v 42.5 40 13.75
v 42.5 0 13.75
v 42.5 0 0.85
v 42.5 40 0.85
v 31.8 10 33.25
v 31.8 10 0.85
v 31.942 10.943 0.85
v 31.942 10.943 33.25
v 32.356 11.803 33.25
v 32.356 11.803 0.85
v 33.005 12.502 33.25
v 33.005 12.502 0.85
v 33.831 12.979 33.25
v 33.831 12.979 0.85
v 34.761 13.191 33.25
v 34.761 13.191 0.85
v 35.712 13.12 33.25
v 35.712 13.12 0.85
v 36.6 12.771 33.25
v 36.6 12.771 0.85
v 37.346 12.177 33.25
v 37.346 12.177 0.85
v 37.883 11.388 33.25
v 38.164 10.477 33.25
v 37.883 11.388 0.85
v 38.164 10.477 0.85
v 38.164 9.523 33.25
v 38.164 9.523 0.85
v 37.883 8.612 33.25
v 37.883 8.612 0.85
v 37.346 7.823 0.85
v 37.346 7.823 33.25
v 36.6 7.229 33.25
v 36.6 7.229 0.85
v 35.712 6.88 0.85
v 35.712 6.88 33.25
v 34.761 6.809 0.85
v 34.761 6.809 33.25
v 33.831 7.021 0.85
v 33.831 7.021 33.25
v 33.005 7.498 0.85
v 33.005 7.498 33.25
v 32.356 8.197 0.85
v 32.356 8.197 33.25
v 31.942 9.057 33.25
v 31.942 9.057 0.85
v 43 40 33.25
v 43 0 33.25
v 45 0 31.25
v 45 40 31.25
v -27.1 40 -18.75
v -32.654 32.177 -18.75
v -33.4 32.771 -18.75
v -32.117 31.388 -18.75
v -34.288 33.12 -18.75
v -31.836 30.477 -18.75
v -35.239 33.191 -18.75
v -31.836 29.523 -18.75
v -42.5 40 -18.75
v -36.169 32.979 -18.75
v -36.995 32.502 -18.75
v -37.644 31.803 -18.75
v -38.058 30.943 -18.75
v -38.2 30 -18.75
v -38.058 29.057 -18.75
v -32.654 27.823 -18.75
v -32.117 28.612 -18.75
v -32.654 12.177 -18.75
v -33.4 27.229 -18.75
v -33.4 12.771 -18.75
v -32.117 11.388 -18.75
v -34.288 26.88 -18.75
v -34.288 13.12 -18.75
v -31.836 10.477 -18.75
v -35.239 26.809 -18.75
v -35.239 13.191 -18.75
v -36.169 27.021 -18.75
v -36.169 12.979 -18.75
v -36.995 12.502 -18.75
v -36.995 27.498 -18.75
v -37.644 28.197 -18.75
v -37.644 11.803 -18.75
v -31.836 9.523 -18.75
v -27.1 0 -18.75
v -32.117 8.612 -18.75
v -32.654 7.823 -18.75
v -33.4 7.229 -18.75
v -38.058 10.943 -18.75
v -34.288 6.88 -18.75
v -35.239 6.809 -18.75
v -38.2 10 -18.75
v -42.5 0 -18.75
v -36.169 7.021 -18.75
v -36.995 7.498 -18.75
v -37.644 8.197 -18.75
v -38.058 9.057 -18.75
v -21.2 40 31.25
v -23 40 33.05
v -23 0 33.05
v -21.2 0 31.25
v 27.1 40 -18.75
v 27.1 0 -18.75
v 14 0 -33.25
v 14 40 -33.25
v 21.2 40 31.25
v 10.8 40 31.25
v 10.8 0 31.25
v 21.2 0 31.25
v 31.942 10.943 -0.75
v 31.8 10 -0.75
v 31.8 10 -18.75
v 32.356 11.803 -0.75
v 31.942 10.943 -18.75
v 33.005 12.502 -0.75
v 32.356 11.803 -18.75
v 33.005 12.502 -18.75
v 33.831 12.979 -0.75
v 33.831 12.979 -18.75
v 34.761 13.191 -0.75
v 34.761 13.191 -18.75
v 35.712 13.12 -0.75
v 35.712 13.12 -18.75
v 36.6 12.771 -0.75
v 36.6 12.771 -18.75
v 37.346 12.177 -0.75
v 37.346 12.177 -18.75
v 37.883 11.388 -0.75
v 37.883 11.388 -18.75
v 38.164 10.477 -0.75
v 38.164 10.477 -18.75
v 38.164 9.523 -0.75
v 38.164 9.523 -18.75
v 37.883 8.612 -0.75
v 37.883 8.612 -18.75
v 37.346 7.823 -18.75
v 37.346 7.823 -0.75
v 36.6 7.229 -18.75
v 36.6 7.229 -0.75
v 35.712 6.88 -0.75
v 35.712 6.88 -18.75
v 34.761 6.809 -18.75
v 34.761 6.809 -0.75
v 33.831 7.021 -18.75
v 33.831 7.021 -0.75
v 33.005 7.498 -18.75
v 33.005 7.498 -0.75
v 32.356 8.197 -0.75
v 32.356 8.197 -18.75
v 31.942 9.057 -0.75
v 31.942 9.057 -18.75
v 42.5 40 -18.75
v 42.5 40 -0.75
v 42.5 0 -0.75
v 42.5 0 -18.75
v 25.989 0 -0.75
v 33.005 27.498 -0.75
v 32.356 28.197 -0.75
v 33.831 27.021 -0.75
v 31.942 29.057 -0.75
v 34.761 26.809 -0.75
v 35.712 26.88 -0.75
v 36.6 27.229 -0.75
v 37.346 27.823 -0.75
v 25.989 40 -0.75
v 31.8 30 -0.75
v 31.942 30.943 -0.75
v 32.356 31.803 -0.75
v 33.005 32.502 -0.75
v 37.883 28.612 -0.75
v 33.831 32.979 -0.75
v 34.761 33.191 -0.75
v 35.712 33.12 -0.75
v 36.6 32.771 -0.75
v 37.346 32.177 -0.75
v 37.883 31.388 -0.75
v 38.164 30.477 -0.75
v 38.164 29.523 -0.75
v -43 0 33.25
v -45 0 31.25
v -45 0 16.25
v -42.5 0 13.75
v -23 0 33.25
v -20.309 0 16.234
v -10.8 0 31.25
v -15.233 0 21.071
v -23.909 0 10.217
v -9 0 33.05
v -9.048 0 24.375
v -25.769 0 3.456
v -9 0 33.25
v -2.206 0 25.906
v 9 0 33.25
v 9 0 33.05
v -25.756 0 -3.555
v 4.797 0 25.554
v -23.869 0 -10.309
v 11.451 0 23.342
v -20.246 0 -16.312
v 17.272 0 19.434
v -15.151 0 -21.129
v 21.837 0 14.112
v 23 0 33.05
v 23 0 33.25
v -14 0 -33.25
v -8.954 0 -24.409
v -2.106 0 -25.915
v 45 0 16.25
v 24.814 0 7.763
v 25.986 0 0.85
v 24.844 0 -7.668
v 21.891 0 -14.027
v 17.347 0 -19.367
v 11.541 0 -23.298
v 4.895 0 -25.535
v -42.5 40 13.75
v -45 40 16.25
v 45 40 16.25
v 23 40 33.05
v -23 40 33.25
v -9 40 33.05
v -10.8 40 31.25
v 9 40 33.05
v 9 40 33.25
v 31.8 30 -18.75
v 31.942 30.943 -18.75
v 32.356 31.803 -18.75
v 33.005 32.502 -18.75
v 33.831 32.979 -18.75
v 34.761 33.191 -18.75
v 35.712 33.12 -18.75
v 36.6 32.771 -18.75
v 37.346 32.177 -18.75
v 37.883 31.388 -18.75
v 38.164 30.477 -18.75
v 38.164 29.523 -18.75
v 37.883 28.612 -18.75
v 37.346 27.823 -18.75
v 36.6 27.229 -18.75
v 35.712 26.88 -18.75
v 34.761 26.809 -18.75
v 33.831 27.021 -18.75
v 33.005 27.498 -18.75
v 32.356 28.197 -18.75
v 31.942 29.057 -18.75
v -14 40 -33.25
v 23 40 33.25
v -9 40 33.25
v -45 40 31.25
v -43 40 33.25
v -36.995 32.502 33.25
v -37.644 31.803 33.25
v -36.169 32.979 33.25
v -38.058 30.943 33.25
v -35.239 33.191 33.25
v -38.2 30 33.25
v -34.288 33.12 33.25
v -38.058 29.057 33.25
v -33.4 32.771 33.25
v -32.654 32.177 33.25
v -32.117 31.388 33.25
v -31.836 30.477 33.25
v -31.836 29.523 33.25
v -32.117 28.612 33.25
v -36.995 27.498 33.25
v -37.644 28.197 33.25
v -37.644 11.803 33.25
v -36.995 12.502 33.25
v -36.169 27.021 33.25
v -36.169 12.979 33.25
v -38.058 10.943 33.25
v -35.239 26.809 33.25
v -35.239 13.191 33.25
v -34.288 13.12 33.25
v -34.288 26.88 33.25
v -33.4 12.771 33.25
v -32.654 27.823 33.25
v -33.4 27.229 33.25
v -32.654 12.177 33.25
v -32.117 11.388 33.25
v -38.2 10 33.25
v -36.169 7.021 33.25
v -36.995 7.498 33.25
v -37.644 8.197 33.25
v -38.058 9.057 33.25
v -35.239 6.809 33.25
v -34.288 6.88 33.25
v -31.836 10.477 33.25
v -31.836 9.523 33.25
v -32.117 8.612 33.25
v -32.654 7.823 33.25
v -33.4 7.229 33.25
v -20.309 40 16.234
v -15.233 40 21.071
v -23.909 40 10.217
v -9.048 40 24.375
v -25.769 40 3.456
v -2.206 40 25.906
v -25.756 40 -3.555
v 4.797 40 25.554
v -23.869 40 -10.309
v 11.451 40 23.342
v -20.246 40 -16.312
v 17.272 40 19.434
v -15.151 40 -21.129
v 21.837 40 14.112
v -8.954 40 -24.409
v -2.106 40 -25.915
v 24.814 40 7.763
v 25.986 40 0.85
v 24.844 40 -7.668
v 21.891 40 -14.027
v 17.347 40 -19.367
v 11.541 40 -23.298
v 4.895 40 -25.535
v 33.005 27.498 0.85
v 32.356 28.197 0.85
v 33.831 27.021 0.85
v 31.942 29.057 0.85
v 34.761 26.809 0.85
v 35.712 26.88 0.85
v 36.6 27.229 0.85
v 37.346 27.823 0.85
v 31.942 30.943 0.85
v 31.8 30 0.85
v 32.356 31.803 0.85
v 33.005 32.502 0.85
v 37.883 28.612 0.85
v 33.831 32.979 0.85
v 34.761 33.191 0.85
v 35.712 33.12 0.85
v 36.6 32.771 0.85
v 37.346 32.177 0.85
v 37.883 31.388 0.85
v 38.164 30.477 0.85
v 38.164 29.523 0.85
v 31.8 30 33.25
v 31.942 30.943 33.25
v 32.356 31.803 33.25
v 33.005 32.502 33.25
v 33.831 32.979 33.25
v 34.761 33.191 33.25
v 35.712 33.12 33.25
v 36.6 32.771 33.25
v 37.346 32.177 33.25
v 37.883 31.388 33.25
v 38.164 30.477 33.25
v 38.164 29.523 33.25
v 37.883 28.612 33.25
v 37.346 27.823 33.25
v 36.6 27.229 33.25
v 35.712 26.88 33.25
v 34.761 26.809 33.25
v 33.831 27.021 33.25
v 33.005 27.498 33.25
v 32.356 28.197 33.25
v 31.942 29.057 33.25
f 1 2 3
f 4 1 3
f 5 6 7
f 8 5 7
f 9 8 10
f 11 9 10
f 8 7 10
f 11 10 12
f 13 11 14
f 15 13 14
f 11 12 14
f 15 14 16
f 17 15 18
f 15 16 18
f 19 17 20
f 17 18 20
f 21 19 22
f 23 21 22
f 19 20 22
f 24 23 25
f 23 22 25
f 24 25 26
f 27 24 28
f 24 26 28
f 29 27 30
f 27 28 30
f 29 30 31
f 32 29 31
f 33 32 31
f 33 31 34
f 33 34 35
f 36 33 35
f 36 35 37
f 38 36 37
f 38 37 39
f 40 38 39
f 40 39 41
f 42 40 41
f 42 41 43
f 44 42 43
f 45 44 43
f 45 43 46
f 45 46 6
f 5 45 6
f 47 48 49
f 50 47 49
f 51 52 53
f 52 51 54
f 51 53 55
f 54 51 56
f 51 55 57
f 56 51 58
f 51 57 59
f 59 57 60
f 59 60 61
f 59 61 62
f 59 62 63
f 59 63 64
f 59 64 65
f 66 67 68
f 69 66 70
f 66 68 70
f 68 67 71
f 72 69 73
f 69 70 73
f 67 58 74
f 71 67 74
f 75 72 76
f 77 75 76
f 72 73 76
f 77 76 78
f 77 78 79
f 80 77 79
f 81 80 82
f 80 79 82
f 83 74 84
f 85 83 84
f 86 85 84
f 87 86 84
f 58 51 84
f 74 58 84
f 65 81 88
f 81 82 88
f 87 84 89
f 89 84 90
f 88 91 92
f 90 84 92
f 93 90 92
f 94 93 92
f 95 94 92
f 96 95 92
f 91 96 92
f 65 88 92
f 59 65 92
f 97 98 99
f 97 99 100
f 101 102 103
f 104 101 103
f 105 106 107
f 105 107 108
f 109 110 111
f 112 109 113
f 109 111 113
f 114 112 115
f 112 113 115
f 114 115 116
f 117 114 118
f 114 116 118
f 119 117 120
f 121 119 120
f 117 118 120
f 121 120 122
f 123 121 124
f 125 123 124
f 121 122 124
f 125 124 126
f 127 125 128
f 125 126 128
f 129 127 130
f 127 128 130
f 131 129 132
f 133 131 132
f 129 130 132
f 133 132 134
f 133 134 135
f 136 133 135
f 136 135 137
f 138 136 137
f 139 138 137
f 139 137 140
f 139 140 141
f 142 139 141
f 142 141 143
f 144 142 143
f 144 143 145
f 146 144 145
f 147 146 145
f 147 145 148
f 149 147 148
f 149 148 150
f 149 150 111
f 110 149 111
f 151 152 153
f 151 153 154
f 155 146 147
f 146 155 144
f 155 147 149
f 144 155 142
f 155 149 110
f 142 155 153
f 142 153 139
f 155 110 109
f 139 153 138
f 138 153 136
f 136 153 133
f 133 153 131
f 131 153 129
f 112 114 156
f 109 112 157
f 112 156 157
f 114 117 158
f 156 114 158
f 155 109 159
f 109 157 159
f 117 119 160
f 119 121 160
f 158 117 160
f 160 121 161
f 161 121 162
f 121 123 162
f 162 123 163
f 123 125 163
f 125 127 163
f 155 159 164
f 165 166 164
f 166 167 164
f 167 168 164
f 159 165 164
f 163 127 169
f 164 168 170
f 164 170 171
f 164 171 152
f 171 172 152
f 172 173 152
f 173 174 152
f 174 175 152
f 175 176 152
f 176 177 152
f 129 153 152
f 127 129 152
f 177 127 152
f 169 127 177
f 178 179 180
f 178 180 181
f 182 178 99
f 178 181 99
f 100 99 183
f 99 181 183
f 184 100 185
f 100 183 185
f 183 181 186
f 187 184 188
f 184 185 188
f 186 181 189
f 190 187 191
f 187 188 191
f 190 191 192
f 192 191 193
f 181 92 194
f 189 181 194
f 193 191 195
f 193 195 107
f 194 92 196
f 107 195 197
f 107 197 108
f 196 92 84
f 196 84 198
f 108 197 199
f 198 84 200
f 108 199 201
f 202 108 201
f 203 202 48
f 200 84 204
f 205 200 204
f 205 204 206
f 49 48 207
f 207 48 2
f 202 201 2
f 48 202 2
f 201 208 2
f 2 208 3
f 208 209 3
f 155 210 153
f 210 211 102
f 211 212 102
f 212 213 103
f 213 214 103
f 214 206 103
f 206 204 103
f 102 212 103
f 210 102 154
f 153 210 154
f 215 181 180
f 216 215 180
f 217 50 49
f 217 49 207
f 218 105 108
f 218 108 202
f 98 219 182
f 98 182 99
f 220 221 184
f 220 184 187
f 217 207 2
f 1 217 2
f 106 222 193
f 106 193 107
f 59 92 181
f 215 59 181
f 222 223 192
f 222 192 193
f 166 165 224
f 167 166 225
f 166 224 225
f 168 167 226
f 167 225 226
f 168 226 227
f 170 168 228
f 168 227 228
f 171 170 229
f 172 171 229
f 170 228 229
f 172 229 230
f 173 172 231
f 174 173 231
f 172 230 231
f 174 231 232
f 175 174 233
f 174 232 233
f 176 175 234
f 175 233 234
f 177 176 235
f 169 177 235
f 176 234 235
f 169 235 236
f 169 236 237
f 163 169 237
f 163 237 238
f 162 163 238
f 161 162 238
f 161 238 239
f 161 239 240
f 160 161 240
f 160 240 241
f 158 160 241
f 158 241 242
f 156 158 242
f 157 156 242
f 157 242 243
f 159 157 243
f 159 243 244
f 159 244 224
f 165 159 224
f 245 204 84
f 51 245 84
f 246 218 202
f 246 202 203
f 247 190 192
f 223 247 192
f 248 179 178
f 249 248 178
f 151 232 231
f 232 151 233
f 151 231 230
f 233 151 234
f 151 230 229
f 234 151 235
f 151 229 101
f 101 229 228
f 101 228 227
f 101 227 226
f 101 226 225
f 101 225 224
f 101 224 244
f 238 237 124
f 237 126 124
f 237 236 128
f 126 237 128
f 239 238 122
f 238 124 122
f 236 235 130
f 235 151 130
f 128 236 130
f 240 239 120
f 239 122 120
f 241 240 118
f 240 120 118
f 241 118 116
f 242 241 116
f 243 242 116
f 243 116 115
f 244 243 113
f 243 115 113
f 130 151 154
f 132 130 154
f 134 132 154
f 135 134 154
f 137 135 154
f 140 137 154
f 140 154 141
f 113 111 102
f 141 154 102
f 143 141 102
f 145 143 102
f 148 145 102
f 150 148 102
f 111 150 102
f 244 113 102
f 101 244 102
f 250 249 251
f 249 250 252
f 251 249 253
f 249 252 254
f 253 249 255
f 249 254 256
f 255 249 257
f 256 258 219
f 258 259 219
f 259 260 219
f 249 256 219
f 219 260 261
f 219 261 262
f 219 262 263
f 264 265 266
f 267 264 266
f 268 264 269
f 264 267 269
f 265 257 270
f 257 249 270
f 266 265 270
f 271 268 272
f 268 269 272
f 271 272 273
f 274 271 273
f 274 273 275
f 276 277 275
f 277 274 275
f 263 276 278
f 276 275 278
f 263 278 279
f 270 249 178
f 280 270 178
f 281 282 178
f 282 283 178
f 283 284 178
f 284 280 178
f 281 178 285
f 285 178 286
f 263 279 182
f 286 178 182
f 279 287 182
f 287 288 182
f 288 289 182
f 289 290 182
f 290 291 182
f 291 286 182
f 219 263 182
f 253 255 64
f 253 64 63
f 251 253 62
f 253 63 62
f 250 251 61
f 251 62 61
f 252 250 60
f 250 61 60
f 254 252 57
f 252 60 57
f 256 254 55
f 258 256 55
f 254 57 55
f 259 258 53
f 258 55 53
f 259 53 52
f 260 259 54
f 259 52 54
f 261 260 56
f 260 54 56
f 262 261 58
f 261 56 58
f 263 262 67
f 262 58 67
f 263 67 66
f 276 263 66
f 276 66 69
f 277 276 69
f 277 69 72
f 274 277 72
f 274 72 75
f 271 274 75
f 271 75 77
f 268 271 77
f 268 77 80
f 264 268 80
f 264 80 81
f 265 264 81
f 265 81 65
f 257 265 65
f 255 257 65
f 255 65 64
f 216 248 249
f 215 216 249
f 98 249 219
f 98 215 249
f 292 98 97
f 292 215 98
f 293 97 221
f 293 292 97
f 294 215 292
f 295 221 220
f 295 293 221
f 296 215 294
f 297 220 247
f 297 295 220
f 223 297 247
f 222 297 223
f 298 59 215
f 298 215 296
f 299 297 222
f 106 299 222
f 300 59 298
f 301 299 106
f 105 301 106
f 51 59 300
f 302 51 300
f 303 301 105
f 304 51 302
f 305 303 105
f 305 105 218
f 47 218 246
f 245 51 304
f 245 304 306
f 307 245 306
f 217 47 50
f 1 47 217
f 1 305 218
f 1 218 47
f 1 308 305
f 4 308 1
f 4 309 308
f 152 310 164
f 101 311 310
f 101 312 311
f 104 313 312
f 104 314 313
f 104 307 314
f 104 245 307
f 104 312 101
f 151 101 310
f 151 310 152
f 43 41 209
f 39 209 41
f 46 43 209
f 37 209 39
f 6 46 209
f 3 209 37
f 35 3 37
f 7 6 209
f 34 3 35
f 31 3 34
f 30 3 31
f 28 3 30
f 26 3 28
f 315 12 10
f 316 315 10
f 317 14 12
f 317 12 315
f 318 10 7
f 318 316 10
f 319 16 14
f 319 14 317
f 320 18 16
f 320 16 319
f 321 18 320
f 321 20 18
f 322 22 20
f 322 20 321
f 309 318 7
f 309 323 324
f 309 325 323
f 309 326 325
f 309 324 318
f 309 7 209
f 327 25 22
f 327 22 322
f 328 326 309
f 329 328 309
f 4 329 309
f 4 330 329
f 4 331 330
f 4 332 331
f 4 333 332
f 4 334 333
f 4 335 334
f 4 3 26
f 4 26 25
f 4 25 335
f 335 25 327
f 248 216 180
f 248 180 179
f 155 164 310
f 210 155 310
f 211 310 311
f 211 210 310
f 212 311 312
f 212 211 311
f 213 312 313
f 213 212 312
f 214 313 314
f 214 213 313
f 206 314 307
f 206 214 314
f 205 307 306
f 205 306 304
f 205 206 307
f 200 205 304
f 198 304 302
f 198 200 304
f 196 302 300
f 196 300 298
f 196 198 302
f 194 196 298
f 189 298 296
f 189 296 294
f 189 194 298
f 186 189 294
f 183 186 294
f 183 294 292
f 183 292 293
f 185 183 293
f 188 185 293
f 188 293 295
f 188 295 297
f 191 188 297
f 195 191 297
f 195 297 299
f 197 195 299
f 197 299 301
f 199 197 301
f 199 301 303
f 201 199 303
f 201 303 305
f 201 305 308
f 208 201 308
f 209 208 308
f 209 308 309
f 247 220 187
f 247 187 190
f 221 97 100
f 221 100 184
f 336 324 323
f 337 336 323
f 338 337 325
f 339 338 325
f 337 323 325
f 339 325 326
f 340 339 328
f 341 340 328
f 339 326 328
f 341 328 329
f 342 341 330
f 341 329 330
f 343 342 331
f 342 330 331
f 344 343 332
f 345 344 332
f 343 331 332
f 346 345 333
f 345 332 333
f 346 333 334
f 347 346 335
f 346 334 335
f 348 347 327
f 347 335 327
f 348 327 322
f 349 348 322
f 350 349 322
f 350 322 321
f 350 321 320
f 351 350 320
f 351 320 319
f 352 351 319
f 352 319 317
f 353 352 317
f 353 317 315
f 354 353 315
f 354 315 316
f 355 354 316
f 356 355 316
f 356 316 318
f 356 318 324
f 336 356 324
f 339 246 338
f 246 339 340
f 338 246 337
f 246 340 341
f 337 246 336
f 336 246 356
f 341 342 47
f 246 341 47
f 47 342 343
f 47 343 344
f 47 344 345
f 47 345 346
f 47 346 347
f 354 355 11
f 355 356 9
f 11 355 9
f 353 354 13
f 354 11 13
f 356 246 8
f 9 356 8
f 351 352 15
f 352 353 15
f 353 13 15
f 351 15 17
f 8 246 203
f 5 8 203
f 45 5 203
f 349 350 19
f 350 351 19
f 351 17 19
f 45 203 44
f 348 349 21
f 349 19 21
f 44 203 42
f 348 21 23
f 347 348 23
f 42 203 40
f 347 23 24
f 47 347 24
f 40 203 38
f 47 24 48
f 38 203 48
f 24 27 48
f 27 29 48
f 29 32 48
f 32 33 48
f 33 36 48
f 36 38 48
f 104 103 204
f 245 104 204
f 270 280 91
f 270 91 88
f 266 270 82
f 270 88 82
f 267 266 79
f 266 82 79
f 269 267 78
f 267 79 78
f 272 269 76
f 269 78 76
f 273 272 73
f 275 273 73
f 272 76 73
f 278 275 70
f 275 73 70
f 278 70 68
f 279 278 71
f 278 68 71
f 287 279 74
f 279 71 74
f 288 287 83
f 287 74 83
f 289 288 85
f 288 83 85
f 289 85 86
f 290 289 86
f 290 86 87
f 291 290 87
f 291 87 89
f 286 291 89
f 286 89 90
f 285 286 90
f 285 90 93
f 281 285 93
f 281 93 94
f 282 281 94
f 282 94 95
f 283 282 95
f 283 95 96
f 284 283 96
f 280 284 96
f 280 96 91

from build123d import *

# Parameters (mm, degrees)
CROQUIS1_R              = 26
SALIENTE_EXTRUIR1_DEPTH = 40
CROQUIS2_R              = 3.2
CORTAR_EXTRUIR1_DEPTH   = 67.5
CORTAR_EXTRUIR2_REACH   = 89.5
CROQUIS3_W              = 1.6
CROQUIS3_H              = 40


with BuildPart() as part:
    # Croquis1 → Saliente-Extruir1 (new body)
    with BuildSketch(Plane(origin=(0, 0, 0), x_dir=(1, 0, 0), z_dir=(0, 1, 0))):
        Polygon((-42.5, 18.75), (-42.5, -13.75), (-45, -16.25), (-45, -31.25), (-43, -33.25), (-23, -33.25), (-23, -33.05), (-21.2, -31.25), (-10.8, -31.25), (-9, -33.05), (-9, -33.25), (9, -33.25), (9, -33.05), (10.8, -31.25), (21.2, -31.25), (23, -33.05), (23, -33.25), (43, -33.25), (45, -31.25), (45, -16.25), (42.5, -13.75), (42.5, 18.75), (27.1, 18.75), (14, 33.25), (-14, 33.25), (-27.1, 18.75), align=None)
        Circle(CROQUIS1_R, mode=Mode.SUBTRACT)
    extrude(amount=SALIENTE_EXTRUIR1_DEPTH)

    # Croquis2 → Cortar-Extruir1 (cut, through all)
    with BuildSketch(Plane(origin=(0, 0, -33.25), x_dir=(-1, 0, 0), z_dir=(0, 0, -1))):
        with Locations((-35, 30)):
            Circle(CROQUIS2_R)
        with Locations((-35, 10)):
            Circle(CROQUIS2_R)
        with Locations((35, 10)):
            Circle(CROQUIS2_R)
        with Locations((35, 30)):
            Circle(CROQUIS2_R)
    extrude(amount=-CORTAR_EXTRUIR1_DEPTH, mode=Mode.SUBTRACT)

    # Croquis3 → Cortar-Extruir2 (cut, up to next)
    with BuildSketch(Plane(origin=(42.5, 0, 0), x_dir=(0, 0, -1), z_dir=(1, 0, 0)), mode=Mode.PRIVATE) as cortar_extruir2_sk1:
        with Locations((-0.05, 20)):
            Rectangle(CROQUIS3_W, CROQUIS3_H)
    cortar_extruir2_tool1 = extrude(cortar_extruir2_sk1.sketch, amount=-CORTAR_EXTRUIR2_REACH, mode=Mode.PRIVATE) & part.part
    add(cortar_extruir2_tool1.solids().sort_by_distance((42.5, 20, 0.05))[0], mode=Mode.SUBTRACT)


solid = part.part
